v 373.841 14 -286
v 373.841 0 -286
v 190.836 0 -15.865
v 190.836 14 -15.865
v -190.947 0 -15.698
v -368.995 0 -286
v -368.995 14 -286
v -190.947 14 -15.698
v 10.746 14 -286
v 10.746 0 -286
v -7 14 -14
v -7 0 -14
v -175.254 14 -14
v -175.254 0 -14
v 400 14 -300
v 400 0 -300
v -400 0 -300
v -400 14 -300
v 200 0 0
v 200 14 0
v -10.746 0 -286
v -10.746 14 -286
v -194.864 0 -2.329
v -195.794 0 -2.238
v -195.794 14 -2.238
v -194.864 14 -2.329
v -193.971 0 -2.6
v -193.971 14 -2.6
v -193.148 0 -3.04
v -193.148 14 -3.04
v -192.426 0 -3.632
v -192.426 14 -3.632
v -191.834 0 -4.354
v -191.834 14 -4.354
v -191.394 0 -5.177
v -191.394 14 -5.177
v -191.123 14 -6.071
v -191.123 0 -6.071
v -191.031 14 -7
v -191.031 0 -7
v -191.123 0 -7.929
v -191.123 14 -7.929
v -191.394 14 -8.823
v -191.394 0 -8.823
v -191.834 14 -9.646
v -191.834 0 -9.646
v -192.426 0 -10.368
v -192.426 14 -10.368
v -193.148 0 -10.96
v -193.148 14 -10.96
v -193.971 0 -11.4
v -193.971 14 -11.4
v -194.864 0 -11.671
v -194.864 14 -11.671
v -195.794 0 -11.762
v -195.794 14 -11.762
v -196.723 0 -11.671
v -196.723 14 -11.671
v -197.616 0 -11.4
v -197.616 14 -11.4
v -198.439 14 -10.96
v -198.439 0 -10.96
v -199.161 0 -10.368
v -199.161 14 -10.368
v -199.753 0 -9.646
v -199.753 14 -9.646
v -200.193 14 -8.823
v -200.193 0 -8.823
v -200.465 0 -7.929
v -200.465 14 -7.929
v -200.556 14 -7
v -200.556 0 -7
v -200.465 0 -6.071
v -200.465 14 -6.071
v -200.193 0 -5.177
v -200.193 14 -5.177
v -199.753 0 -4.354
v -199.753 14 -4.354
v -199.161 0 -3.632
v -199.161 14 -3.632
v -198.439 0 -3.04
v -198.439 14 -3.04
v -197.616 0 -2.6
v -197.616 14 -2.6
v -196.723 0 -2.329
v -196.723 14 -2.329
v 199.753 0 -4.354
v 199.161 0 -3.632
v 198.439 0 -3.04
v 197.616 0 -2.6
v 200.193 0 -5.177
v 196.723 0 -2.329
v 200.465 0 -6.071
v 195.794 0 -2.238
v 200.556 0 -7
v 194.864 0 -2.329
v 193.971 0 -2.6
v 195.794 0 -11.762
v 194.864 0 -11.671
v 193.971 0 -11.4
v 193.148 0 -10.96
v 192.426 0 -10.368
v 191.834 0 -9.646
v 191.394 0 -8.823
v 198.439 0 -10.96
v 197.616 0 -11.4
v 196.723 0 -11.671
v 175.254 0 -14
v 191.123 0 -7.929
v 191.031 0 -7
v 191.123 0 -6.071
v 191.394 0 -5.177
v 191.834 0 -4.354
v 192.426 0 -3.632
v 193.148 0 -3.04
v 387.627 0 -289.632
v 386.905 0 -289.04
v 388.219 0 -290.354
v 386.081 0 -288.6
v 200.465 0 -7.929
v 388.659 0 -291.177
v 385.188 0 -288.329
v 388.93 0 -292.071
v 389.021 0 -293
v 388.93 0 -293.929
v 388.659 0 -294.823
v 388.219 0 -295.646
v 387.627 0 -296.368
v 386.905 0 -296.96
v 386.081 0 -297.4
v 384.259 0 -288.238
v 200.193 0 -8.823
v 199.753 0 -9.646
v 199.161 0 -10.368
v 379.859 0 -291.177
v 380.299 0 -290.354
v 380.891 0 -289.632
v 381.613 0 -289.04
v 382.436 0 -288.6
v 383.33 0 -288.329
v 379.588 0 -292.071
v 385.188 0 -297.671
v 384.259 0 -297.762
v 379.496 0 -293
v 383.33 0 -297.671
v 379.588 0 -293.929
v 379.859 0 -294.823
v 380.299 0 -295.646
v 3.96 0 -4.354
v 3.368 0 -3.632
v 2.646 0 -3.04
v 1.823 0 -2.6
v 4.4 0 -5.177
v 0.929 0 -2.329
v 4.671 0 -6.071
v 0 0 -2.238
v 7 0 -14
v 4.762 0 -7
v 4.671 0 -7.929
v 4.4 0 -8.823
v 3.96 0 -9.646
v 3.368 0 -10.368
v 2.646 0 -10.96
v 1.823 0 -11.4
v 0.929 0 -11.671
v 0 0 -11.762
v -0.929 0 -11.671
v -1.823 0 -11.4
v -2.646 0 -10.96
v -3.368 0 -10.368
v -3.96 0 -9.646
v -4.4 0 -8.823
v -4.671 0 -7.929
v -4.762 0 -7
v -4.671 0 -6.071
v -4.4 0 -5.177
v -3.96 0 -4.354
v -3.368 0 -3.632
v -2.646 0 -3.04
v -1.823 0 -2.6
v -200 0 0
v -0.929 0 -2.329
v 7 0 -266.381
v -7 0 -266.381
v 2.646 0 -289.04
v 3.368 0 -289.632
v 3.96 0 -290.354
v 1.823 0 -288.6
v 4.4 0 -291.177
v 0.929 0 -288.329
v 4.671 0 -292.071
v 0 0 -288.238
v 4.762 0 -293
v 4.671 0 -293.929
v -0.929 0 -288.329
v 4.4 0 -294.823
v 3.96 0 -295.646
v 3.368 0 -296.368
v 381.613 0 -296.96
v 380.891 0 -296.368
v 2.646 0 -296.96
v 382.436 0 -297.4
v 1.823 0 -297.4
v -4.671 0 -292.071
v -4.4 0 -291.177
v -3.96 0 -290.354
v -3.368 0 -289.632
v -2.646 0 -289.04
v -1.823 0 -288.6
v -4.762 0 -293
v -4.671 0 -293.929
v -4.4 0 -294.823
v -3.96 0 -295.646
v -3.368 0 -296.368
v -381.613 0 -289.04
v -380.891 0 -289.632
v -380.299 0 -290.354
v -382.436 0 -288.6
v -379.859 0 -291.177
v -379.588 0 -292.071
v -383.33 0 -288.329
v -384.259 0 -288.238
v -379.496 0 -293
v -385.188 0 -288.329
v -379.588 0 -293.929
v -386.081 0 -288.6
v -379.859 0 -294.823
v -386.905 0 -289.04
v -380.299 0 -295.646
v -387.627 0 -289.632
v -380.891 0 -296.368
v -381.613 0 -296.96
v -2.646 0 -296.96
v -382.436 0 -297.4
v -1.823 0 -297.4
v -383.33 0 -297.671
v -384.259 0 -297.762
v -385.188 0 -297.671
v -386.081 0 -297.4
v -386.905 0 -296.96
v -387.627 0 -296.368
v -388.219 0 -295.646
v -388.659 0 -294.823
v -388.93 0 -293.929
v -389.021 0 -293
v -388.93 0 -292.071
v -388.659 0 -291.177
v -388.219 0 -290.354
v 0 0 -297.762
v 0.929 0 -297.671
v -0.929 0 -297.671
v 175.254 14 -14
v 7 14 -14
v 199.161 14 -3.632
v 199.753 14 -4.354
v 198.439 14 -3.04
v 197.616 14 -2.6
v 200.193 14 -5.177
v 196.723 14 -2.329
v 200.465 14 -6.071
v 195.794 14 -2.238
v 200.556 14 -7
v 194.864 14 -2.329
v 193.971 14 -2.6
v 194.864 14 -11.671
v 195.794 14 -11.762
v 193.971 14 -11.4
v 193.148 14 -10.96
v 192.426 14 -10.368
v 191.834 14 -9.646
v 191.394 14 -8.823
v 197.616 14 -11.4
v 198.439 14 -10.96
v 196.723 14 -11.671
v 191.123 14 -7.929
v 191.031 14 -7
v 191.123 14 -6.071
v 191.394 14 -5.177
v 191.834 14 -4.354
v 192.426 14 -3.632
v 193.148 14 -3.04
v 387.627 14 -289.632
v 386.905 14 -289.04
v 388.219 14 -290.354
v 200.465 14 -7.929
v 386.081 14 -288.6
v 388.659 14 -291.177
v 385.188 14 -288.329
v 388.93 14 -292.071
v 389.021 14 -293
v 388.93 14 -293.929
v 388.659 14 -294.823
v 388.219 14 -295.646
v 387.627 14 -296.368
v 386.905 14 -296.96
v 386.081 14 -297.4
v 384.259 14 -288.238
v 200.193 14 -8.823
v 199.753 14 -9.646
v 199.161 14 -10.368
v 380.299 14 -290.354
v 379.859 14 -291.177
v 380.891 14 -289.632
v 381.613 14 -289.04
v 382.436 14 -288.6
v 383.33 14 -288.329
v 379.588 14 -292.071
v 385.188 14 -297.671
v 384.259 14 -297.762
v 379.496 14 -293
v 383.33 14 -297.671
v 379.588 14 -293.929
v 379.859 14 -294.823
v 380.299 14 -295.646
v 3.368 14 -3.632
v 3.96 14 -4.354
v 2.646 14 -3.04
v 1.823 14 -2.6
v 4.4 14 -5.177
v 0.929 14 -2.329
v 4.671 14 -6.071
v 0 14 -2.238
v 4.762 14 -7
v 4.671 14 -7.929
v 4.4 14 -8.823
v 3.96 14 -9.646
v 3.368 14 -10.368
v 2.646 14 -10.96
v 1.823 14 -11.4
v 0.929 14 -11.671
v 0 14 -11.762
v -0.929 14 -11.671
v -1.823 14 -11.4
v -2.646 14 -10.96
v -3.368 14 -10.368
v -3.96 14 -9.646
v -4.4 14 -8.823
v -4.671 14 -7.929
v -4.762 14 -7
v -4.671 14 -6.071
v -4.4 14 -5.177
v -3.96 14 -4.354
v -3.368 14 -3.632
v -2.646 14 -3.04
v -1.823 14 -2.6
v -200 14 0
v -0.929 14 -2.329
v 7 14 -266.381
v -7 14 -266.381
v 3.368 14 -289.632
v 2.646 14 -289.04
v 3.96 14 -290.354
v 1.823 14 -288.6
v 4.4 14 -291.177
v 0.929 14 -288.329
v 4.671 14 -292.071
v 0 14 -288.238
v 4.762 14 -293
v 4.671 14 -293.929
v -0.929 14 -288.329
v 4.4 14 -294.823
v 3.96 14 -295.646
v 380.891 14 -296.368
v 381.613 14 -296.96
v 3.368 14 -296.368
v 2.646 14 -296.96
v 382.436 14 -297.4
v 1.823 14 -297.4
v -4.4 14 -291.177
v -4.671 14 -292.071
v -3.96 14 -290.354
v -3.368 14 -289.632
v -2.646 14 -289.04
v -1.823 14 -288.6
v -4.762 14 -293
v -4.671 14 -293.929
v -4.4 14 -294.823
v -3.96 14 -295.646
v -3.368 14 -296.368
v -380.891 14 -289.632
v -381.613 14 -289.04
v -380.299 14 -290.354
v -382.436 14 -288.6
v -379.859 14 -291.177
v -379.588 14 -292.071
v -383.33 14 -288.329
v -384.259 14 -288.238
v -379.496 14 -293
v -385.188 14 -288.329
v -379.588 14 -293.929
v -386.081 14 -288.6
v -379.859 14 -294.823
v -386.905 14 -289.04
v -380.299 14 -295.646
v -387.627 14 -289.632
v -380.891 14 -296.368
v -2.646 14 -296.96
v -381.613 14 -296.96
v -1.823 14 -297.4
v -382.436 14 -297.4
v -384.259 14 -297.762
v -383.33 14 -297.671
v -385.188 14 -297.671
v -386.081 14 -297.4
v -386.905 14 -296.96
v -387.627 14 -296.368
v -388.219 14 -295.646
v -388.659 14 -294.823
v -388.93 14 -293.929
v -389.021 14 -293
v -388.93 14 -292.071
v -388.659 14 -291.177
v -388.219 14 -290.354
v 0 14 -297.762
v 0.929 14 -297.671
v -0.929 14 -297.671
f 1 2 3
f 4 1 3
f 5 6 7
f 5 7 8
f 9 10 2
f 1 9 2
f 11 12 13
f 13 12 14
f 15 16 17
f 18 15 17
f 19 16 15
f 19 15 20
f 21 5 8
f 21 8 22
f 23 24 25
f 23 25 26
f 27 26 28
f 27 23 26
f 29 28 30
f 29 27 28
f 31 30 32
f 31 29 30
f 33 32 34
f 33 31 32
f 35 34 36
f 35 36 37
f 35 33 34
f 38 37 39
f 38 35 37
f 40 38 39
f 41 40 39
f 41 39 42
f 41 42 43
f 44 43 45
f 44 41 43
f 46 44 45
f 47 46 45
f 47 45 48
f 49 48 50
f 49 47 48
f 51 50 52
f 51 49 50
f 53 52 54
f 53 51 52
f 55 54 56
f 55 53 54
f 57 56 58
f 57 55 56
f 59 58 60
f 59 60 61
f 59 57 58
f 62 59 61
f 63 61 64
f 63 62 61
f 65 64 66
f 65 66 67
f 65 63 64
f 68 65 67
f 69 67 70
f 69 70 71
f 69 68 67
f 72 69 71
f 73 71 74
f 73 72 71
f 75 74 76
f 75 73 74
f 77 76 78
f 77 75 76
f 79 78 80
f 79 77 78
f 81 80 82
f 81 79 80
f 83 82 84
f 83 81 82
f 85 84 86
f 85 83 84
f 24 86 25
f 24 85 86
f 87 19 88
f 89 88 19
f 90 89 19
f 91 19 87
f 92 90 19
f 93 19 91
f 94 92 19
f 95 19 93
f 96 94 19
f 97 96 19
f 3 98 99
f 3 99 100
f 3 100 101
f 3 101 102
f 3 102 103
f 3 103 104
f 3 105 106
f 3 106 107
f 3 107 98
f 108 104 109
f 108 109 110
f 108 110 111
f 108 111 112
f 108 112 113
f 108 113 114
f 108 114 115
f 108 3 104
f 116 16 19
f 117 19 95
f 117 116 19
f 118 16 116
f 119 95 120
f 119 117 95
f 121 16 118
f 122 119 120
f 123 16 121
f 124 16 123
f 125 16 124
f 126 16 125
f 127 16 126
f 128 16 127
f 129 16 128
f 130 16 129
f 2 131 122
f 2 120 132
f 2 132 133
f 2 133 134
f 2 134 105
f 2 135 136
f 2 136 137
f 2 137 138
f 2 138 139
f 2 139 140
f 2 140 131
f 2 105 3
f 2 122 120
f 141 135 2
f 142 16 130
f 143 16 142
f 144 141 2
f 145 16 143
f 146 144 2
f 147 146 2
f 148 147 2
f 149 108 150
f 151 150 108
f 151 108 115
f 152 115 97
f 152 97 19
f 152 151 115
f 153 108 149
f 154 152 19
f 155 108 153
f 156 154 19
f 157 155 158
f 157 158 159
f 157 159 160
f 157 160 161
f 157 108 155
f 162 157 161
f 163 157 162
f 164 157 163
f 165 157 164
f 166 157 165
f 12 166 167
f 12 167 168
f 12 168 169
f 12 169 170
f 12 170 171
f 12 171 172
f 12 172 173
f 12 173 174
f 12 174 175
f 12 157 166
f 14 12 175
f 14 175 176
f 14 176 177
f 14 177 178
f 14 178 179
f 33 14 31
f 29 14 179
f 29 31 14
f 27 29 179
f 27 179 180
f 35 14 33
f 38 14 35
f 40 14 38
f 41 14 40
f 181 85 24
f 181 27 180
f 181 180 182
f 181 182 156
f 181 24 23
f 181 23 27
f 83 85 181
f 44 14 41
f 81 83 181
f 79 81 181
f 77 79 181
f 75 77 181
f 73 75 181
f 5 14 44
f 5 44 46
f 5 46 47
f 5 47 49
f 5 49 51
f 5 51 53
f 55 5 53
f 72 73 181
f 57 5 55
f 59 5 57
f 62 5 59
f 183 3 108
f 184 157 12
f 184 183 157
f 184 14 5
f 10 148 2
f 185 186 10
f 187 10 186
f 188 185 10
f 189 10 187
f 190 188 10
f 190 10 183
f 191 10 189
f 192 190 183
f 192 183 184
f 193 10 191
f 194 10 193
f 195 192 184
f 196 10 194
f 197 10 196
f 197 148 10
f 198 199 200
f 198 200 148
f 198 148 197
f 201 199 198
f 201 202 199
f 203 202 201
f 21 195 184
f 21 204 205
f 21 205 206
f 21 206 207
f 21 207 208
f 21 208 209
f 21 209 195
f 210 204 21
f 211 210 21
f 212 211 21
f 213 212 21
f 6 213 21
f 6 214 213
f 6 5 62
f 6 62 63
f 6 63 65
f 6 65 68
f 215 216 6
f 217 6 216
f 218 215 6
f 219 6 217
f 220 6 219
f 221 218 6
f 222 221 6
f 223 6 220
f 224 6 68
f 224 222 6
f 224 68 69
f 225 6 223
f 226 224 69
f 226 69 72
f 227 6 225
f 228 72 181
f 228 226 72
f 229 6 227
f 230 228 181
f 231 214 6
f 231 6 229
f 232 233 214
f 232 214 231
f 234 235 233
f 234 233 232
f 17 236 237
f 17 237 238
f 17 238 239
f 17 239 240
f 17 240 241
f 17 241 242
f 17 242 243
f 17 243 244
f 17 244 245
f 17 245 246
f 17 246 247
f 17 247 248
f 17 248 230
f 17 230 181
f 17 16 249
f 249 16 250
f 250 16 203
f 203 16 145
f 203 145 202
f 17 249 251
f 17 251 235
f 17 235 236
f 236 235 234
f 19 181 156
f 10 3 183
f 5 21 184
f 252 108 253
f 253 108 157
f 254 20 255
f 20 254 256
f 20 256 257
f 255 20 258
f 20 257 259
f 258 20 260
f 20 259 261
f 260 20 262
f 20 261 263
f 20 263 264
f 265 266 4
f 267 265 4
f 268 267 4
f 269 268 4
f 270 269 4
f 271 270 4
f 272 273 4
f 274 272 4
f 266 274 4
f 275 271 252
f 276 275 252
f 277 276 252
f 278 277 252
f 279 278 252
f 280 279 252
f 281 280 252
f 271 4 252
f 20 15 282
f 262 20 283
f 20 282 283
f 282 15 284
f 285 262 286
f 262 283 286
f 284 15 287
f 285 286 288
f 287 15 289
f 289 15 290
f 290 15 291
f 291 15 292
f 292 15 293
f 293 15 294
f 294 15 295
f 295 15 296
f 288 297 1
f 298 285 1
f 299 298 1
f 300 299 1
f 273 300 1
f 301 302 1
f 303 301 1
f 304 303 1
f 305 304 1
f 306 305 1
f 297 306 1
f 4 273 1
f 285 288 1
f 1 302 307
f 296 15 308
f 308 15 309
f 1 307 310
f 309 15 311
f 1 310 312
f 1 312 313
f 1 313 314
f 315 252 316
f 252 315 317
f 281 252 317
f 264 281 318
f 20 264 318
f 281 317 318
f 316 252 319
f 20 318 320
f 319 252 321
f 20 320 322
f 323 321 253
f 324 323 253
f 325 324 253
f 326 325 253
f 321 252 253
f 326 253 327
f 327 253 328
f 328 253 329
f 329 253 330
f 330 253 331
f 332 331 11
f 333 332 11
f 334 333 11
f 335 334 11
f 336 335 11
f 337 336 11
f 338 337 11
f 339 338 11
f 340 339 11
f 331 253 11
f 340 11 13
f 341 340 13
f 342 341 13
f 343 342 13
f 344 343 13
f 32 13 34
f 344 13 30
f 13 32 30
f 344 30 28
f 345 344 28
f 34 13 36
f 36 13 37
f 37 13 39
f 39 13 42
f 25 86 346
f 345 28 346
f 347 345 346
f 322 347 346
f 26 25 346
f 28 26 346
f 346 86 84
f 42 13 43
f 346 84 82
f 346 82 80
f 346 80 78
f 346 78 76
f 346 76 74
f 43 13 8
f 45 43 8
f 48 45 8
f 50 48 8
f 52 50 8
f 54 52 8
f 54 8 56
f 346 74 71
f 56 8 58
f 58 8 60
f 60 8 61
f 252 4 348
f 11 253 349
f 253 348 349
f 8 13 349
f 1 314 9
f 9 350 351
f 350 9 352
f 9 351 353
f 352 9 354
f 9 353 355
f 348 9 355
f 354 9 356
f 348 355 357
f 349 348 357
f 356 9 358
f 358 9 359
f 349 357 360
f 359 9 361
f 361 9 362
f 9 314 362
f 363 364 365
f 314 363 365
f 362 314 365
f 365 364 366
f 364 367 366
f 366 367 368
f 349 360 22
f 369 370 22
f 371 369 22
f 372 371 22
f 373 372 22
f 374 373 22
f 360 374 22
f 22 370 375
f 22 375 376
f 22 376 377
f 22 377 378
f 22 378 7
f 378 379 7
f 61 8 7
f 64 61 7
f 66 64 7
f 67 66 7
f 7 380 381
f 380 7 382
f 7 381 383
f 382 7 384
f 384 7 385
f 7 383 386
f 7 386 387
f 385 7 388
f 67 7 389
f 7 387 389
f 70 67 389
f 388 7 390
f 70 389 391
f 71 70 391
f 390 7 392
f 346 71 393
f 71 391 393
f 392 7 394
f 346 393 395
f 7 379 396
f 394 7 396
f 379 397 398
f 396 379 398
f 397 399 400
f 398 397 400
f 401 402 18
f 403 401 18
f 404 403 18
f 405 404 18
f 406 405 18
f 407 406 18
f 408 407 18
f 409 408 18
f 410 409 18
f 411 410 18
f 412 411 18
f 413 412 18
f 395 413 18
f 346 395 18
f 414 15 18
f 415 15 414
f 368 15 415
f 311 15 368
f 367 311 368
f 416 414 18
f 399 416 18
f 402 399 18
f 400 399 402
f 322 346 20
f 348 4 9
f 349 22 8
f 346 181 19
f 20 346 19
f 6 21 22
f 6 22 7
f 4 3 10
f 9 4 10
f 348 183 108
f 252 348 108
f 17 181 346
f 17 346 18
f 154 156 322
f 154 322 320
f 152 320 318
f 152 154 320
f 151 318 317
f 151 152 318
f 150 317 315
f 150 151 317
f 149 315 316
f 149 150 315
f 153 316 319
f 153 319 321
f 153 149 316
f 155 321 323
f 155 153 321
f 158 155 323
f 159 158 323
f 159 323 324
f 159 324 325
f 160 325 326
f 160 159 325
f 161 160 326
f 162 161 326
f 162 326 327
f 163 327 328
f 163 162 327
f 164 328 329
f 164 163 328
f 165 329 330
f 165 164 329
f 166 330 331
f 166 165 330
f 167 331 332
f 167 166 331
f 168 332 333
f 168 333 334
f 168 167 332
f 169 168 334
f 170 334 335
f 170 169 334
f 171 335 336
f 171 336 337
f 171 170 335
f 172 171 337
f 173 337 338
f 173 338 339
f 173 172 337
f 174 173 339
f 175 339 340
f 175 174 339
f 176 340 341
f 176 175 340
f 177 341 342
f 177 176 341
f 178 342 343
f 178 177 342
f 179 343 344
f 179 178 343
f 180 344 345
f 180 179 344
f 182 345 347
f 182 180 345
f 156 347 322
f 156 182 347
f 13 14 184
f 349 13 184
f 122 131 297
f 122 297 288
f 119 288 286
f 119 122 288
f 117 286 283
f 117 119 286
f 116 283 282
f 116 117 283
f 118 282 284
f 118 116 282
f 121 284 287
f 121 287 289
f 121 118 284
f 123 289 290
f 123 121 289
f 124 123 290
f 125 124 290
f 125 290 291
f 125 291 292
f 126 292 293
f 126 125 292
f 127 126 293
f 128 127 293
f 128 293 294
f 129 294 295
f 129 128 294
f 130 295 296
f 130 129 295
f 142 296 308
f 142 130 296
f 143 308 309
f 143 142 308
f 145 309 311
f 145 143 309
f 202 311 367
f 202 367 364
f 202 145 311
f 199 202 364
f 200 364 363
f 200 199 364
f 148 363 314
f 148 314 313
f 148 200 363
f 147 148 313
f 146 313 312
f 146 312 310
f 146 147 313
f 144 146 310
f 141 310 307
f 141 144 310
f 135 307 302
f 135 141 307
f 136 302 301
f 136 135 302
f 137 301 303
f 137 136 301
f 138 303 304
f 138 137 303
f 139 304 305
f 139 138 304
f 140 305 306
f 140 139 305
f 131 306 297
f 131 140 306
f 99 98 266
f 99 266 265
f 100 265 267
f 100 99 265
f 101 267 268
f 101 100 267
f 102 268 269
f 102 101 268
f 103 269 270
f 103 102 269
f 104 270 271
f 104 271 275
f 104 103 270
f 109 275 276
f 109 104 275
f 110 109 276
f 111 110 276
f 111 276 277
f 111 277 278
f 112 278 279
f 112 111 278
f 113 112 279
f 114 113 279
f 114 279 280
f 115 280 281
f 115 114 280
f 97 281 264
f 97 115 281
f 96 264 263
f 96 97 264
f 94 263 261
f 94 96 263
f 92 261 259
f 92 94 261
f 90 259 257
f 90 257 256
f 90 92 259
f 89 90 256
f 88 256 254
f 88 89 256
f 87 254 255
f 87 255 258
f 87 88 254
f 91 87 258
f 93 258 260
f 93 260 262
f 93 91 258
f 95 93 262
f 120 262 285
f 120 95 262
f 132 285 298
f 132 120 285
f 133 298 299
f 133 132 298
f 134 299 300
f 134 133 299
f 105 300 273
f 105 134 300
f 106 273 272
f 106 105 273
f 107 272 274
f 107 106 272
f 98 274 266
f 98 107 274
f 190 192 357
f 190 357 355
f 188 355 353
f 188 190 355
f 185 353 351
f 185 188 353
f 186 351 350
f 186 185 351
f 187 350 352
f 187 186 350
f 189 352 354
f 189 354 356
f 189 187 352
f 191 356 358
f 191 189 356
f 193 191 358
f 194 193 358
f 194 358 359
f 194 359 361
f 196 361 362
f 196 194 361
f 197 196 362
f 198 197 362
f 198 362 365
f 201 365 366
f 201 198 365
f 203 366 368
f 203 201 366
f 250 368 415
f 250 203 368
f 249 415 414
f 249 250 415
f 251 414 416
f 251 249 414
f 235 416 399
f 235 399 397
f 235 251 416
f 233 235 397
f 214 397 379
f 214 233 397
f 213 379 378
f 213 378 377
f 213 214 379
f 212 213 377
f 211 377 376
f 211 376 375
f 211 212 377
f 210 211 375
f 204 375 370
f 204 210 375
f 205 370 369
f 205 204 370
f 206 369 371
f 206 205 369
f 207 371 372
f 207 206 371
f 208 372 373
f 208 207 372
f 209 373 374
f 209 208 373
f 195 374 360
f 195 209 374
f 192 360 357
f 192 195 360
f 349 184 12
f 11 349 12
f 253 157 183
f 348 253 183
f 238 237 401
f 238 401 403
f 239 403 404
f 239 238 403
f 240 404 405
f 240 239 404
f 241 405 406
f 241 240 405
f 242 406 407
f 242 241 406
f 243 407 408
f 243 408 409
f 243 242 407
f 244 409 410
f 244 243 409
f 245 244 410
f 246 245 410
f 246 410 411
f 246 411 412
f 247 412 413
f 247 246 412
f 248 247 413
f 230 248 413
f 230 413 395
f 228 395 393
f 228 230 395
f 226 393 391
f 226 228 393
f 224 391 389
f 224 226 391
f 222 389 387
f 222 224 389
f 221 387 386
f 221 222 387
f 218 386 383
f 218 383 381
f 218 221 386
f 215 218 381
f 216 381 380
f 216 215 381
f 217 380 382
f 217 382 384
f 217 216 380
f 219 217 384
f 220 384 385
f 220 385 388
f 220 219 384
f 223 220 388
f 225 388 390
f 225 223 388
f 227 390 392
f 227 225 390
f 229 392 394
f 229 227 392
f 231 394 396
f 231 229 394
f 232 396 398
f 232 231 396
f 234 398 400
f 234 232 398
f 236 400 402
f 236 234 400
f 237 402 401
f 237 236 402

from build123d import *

# Parameters (mm, degrees)
SKETCH1_R           = 4.7625
BOSS_EXTRUDE2_DEPTH = 14


with BuildPart() as part:
    # Sketch1 → Boss-Extrude2 (new body)
    with BuildSketch(Plane(origin=(0, 0, 0), x_dir=(1, 0, 0), z_dir=(0, 1, 0))):
        Polygon((0, 300), (400, 300), (200, 0), (0, 0), (-200, 0), (-400, 300), align=None)
        with Locations(Location((0, 293, 0), (0, 0, 270))):
            Circle(SKETCH1_R, mode=Mode.SUBTRACT)
        with Locations(Location((0, 7, 0), (0, 0, 270))):
            Circle(SKETCH1_R, mode=Mode.SUBTRACT)
        with Locations(Location((384.258956968, 293, 0), (0, 0, 270))):
            Circle(SKETCH1_R, mode=Mode.SUBTRACT)
        with Locations(Location((-384.258956968, 293, 0), (0, 0, 90))):
            Circle(SKETCH1_R, mode=Mode.SUBTRACT)
        with Locations(Location((-195.793523512, 7, 0), (0, 0, 270))):
            Circle(SKETCH1_R, mode=Mode.SUBTRACT)
        with Locations(Location((195.793523512, 7, 0), (0, 0, 90))):
            Circle(SKETCH1_R, mode=Mode.SUBTRACT)
        Polygon((7, 14), (7, 266.380570536), (175.253713691, 14), align=None, mode=Mode.SUBTRACT)
        Polygon((10.746286309, 286), (373.840760715, 286), (190.836035912, 15.865375596), align=None, mode=Mode.SUBTRACT)
        Polygon((-190.947369666, 15.698374965), (-10.746286309, 286), (-368.994606868, 286), align=None, mode=Mode.SUBTRACT)
        Polygon((-175.253713691, 14), (-7, 266.380570536), (-7, 14), align=None, mode=Mode.SUBTRACT)
    extrude(amount=BOSS_EXTRUDE2_DEPTH)


solid = part.part
